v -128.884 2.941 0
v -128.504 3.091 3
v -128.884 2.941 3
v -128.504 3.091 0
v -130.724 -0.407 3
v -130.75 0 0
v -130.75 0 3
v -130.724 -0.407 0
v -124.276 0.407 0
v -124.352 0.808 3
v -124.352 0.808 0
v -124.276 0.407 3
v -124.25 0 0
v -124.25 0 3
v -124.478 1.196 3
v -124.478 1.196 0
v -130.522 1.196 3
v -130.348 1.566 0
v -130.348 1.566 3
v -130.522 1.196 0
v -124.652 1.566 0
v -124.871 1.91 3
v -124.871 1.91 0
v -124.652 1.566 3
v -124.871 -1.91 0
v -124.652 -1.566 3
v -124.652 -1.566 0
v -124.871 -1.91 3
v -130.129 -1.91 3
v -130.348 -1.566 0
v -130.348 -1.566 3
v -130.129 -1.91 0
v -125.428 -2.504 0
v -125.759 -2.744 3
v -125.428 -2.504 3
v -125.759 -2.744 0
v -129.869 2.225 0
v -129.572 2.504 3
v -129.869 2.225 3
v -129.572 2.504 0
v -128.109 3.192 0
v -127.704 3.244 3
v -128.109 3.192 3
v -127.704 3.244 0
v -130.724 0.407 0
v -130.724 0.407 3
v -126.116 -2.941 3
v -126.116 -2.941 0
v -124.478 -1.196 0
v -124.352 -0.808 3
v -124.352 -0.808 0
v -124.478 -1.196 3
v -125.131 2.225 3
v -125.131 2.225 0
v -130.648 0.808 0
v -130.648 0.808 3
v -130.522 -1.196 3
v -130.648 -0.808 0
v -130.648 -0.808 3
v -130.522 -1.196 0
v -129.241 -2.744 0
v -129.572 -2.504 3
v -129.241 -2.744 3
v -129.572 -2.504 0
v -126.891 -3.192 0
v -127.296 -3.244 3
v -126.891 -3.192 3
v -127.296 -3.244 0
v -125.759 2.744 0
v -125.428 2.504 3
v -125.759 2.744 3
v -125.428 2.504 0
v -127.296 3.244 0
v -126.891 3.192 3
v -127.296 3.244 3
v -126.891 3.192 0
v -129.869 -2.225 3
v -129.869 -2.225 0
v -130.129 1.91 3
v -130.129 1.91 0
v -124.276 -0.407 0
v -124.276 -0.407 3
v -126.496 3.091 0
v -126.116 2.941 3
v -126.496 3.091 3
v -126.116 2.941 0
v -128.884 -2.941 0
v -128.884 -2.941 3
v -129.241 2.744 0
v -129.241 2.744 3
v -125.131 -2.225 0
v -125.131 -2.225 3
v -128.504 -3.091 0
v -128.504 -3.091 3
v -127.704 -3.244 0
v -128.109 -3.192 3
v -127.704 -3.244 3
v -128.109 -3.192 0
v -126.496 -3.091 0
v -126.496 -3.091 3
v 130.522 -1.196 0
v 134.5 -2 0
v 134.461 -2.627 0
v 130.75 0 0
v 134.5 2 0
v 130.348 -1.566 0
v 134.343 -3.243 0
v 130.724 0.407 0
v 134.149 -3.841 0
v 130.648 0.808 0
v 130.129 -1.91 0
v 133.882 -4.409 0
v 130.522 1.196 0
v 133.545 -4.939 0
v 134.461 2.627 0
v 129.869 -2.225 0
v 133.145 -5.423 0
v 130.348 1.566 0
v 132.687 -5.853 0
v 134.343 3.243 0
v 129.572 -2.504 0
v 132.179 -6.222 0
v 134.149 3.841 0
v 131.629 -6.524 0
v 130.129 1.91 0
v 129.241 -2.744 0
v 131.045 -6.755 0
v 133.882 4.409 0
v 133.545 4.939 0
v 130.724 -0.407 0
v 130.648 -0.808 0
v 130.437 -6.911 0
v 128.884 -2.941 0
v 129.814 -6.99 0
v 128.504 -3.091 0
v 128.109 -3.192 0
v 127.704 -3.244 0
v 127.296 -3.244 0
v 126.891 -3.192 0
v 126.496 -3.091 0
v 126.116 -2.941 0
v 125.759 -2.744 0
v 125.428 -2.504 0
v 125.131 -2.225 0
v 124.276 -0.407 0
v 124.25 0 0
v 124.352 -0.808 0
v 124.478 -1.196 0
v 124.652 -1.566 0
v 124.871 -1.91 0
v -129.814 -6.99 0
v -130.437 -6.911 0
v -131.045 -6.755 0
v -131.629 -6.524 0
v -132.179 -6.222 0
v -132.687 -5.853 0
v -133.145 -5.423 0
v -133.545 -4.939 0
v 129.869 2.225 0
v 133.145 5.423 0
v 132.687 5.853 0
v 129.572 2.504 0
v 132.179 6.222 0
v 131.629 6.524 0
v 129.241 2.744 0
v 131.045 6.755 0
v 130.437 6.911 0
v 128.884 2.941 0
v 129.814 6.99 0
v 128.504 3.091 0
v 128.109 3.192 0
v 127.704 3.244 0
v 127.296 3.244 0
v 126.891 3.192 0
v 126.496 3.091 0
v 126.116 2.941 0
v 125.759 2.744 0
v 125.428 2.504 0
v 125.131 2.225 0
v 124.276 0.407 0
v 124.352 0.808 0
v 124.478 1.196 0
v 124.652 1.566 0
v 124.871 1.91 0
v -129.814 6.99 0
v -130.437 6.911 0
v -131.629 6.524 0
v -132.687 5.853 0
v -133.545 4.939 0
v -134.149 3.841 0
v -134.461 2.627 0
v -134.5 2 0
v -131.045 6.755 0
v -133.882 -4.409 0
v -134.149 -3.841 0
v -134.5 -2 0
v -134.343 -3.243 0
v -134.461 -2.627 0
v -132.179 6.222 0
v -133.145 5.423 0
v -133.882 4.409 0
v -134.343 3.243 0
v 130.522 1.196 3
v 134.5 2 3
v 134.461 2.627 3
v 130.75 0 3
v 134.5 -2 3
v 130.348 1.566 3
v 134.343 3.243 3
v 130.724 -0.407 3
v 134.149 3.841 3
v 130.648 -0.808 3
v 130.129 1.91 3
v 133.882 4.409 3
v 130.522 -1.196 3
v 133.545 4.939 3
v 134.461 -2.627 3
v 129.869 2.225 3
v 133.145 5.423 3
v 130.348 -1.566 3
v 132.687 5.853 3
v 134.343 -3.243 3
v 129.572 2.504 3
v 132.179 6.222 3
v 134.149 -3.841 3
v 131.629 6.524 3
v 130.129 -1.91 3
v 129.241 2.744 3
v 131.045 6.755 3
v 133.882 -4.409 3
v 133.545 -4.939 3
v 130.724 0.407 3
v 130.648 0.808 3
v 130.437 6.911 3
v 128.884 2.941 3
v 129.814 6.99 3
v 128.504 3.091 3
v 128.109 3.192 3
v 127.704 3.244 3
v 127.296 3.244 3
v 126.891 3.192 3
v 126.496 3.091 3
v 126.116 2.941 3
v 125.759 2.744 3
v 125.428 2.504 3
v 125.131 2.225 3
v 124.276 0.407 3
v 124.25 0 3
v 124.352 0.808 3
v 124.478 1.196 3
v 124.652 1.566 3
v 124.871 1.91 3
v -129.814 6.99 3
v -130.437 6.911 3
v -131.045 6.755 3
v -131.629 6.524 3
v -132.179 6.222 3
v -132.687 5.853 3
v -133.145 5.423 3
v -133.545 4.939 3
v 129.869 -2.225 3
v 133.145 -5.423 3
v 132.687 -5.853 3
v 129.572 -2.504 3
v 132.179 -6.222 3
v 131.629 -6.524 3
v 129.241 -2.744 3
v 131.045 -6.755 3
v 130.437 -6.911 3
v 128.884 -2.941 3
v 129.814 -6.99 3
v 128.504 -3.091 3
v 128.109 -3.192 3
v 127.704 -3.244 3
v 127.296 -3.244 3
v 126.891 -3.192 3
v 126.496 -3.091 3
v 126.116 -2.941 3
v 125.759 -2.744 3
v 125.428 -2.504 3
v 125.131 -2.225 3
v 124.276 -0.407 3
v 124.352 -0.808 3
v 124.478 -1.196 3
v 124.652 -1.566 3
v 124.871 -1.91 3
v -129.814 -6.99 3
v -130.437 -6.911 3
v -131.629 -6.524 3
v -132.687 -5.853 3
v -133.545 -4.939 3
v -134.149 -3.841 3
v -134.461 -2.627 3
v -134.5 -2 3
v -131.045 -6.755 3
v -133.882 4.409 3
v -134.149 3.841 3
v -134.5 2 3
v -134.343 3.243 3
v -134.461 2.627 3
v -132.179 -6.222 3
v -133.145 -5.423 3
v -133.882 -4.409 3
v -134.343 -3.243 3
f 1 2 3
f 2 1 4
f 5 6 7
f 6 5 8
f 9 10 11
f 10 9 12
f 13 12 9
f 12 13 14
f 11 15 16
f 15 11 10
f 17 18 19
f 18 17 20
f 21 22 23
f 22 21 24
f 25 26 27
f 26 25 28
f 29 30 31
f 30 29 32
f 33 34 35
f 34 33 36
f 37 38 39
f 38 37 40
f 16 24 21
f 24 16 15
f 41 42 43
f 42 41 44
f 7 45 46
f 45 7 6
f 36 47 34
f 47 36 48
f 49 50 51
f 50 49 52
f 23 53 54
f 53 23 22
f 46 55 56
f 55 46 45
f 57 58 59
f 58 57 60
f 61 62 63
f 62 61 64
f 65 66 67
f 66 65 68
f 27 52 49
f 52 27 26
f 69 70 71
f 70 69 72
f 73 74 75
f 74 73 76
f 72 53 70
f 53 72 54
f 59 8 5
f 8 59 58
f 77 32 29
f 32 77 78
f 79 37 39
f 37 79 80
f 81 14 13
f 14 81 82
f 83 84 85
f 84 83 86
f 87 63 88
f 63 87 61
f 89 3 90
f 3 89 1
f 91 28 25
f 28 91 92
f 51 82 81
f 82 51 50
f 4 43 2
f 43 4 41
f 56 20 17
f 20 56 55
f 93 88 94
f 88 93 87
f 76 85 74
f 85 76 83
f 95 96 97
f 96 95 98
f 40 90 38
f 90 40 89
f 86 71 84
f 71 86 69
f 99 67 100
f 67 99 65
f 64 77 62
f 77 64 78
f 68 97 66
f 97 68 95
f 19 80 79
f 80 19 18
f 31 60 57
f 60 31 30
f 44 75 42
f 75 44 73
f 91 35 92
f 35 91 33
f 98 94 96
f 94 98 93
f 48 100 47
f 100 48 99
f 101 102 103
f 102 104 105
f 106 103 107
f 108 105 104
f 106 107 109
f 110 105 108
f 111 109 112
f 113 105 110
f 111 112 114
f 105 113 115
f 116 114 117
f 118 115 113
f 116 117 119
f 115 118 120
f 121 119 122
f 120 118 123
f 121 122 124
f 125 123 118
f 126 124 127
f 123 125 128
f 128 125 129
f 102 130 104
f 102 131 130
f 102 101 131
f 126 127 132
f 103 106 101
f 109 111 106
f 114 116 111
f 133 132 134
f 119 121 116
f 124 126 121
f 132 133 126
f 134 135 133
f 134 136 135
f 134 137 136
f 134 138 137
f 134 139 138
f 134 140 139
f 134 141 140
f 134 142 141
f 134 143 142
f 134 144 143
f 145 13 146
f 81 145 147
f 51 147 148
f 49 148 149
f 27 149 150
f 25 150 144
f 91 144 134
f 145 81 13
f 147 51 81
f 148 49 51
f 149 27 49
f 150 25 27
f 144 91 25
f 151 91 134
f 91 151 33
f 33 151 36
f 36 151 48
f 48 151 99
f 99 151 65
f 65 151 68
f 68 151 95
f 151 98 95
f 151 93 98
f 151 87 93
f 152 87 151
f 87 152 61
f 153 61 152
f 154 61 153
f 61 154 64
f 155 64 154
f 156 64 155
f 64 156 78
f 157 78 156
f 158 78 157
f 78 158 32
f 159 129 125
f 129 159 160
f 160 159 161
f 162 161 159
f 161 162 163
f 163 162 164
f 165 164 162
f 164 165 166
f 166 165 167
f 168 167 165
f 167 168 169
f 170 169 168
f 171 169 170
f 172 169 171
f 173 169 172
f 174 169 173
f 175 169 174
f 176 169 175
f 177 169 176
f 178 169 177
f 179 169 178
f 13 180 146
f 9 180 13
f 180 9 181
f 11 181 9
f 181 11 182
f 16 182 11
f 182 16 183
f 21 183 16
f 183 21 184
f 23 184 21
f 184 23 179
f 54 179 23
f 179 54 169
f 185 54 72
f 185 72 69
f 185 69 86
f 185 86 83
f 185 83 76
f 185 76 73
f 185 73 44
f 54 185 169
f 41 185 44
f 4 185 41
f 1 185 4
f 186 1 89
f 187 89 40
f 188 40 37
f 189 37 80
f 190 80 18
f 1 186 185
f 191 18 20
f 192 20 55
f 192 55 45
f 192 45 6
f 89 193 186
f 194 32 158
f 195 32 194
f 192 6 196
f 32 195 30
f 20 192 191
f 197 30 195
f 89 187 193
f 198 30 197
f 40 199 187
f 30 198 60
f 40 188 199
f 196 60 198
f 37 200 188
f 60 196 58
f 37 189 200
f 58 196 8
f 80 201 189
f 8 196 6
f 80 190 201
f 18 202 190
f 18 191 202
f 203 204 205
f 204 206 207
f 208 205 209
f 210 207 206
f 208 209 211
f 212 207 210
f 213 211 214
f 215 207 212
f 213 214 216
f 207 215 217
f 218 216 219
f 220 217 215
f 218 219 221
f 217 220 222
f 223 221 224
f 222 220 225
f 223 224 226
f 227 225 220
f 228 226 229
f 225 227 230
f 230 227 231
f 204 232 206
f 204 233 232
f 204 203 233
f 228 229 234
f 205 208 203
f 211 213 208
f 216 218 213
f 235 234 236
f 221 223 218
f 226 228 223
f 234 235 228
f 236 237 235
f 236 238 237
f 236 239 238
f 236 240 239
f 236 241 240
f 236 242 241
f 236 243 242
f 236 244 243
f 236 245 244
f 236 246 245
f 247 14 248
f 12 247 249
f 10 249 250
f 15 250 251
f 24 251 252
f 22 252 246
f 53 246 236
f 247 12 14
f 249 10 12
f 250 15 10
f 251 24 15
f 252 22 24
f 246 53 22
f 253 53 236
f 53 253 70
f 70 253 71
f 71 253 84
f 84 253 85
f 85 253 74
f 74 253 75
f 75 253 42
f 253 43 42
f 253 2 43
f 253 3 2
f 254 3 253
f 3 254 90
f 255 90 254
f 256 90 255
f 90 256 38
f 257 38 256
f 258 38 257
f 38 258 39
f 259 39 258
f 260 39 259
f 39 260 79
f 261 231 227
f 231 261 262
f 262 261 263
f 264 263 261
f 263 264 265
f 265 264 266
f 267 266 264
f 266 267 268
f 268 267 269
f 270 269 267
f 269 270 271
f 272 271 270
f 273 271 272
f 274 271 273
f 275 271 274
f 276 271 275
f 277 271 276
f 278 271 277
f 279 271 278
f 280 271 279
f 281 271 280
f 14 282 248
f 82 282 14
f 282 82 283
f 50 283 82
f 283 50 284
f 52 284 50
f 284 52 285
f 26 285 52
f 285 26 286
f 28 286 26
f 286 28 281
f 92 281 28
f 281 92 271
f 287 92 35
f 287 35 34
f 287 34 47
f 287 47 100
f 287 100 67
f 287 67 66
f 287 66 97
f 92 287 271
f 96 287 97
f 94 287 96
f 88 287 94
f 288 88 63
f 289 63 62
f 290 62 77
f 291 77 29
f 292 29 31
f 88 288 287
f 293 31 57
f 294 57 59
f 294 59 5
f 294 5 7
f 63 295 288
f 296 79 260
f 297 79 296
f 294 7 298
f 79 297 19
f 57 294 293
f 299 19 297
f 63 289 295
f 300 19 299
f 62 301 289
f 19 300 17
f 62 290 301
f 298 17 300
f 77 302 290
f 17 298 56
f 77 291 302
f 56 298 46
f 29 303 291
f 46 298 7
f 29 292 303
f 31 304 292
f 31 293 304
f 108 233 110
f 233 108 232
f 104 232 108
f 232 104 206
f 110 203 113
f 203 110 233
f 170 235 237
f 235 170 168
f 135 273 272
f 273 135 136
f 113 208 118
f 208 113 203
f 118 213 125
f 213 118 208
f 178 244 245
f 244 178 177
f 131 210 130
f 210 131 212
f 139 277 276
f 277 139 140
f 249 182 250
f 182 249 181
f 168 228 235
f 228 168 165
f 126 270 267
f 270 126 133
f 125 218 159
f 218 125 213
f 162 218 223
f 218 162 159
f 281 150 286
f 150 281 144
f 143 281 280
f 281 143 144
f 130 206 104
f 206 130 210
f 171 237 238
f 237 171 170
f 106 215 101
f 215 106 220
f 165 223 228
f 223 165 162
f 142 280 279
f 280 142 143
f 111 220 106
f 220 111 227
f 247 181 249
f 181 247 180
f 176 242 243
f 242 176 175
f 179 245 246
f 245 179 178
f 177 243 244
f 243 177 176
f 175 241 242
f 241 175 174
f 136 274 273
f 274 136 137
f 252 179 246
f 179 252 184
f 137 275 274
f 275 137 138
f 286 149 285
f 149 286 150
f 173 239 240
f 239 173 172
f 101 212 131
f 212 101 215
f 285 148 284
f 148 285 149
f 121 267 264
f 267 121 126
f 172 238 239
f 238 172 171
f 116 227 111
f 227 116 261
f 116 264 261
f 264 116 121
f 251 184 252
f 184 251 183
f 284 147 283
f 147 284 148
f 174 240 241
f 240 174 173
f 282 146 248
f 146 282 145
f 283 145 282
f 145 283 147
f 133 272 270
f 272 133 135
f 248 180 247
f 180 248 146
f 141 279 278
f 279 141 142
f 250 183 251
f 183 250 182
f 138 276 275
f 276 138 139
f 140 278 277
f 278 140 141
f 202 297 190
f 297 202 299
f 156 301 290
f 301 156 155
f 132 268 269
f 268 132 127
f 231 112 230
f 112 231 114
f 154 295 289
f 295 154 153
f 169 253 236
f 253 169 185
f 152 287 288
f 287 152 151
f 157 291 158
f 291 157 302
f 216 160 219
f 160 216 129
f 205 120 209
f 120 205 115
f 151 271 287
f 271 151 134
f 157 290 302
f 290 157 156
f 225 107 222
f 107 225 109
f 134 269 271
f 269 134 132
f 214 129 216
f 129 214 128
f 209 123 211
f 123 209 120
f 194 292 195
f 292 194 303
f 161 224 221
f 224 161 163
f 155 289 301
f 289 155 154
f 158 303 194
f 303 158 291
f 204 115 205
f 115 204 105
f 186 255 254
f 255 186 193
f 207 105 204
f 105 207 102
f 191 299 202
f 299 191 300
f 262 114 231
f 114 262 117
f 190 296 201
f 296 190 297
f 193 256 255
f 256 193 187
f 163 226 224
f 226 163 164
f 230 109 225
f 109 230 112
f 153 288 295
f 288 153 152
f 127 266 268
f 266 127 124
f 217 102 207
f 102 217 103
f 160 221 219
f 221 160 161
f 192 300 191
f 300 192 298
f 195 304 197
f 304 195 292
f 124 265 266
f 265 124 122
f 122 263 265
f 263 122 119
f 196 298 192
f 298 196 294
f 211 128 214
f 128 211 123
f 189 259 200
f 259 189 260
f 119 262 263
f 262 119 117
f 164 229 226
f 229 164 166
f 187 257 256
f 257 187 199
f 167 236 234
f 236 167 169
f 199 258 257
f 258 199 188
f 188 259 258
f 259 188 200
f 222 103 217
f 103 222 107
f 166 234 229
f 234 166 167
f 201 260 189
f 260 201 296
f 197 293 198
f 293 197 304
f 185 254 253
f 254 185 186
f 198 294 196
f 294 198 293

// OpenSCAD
$fn = 50;


difference() {
	union() {
		hull() {
			translate(v = [-129.5000000000, 2.0000000000, 0]) {
				cylinder(h = 3, r = 5);
			}
			translate(v = [129.5000000000, 2.0000000000, 0]) {
				cylinder(h = 3, r = 5);
			}
			translate(v = [-129.5000000000, -2.0000000000, 0]) {
				cylinder(h = 3, r = 5);
			}
			translate(v = [129.5000000000, -2.0000000000, 0]) {
				cylinder(h = 3, r = 5);
			}
		}
	}
	union() {
		translate(v = [-127.5000000000, 0.0000000000, 0]) {
			cylinder(h = 3, r = 3.2500000000);
		}
		translate(v = [127.5000000000, 0.0000000000, 0]) {
			cylinder(h = 3, r = 3.2500000000);
		}
		translate(v = [-127.5000000000, 0.0000000000, 0]) {
			cylinder(h = 3, r = 1.8000000000);
		}
		translate(v = [127.5000000000, 0.0000000000, 0]) {
			cylinder(h = 3, r = 1.8000000000);
		}
		translate(v = [-127.5000000000, 0.0000000000, 0]) {
			cylinder(h = 3, r = 1.8000000000);
		}
		translate(v = [127.5000000000, 0.0000000000, 0]) {
			cylinder(h = 3, r = 1.8000000000);
		}
		translate(v = [-127.5000000000, 0.0000000000, 0]) {
			cylinder(h = 3, r = 1.8000000000);
		}
		translate(v = [127.5000000000, 0.0000000000, 0]) {
			cylinder(h = 3, r = 1.8000000000);
		}
	}
}
